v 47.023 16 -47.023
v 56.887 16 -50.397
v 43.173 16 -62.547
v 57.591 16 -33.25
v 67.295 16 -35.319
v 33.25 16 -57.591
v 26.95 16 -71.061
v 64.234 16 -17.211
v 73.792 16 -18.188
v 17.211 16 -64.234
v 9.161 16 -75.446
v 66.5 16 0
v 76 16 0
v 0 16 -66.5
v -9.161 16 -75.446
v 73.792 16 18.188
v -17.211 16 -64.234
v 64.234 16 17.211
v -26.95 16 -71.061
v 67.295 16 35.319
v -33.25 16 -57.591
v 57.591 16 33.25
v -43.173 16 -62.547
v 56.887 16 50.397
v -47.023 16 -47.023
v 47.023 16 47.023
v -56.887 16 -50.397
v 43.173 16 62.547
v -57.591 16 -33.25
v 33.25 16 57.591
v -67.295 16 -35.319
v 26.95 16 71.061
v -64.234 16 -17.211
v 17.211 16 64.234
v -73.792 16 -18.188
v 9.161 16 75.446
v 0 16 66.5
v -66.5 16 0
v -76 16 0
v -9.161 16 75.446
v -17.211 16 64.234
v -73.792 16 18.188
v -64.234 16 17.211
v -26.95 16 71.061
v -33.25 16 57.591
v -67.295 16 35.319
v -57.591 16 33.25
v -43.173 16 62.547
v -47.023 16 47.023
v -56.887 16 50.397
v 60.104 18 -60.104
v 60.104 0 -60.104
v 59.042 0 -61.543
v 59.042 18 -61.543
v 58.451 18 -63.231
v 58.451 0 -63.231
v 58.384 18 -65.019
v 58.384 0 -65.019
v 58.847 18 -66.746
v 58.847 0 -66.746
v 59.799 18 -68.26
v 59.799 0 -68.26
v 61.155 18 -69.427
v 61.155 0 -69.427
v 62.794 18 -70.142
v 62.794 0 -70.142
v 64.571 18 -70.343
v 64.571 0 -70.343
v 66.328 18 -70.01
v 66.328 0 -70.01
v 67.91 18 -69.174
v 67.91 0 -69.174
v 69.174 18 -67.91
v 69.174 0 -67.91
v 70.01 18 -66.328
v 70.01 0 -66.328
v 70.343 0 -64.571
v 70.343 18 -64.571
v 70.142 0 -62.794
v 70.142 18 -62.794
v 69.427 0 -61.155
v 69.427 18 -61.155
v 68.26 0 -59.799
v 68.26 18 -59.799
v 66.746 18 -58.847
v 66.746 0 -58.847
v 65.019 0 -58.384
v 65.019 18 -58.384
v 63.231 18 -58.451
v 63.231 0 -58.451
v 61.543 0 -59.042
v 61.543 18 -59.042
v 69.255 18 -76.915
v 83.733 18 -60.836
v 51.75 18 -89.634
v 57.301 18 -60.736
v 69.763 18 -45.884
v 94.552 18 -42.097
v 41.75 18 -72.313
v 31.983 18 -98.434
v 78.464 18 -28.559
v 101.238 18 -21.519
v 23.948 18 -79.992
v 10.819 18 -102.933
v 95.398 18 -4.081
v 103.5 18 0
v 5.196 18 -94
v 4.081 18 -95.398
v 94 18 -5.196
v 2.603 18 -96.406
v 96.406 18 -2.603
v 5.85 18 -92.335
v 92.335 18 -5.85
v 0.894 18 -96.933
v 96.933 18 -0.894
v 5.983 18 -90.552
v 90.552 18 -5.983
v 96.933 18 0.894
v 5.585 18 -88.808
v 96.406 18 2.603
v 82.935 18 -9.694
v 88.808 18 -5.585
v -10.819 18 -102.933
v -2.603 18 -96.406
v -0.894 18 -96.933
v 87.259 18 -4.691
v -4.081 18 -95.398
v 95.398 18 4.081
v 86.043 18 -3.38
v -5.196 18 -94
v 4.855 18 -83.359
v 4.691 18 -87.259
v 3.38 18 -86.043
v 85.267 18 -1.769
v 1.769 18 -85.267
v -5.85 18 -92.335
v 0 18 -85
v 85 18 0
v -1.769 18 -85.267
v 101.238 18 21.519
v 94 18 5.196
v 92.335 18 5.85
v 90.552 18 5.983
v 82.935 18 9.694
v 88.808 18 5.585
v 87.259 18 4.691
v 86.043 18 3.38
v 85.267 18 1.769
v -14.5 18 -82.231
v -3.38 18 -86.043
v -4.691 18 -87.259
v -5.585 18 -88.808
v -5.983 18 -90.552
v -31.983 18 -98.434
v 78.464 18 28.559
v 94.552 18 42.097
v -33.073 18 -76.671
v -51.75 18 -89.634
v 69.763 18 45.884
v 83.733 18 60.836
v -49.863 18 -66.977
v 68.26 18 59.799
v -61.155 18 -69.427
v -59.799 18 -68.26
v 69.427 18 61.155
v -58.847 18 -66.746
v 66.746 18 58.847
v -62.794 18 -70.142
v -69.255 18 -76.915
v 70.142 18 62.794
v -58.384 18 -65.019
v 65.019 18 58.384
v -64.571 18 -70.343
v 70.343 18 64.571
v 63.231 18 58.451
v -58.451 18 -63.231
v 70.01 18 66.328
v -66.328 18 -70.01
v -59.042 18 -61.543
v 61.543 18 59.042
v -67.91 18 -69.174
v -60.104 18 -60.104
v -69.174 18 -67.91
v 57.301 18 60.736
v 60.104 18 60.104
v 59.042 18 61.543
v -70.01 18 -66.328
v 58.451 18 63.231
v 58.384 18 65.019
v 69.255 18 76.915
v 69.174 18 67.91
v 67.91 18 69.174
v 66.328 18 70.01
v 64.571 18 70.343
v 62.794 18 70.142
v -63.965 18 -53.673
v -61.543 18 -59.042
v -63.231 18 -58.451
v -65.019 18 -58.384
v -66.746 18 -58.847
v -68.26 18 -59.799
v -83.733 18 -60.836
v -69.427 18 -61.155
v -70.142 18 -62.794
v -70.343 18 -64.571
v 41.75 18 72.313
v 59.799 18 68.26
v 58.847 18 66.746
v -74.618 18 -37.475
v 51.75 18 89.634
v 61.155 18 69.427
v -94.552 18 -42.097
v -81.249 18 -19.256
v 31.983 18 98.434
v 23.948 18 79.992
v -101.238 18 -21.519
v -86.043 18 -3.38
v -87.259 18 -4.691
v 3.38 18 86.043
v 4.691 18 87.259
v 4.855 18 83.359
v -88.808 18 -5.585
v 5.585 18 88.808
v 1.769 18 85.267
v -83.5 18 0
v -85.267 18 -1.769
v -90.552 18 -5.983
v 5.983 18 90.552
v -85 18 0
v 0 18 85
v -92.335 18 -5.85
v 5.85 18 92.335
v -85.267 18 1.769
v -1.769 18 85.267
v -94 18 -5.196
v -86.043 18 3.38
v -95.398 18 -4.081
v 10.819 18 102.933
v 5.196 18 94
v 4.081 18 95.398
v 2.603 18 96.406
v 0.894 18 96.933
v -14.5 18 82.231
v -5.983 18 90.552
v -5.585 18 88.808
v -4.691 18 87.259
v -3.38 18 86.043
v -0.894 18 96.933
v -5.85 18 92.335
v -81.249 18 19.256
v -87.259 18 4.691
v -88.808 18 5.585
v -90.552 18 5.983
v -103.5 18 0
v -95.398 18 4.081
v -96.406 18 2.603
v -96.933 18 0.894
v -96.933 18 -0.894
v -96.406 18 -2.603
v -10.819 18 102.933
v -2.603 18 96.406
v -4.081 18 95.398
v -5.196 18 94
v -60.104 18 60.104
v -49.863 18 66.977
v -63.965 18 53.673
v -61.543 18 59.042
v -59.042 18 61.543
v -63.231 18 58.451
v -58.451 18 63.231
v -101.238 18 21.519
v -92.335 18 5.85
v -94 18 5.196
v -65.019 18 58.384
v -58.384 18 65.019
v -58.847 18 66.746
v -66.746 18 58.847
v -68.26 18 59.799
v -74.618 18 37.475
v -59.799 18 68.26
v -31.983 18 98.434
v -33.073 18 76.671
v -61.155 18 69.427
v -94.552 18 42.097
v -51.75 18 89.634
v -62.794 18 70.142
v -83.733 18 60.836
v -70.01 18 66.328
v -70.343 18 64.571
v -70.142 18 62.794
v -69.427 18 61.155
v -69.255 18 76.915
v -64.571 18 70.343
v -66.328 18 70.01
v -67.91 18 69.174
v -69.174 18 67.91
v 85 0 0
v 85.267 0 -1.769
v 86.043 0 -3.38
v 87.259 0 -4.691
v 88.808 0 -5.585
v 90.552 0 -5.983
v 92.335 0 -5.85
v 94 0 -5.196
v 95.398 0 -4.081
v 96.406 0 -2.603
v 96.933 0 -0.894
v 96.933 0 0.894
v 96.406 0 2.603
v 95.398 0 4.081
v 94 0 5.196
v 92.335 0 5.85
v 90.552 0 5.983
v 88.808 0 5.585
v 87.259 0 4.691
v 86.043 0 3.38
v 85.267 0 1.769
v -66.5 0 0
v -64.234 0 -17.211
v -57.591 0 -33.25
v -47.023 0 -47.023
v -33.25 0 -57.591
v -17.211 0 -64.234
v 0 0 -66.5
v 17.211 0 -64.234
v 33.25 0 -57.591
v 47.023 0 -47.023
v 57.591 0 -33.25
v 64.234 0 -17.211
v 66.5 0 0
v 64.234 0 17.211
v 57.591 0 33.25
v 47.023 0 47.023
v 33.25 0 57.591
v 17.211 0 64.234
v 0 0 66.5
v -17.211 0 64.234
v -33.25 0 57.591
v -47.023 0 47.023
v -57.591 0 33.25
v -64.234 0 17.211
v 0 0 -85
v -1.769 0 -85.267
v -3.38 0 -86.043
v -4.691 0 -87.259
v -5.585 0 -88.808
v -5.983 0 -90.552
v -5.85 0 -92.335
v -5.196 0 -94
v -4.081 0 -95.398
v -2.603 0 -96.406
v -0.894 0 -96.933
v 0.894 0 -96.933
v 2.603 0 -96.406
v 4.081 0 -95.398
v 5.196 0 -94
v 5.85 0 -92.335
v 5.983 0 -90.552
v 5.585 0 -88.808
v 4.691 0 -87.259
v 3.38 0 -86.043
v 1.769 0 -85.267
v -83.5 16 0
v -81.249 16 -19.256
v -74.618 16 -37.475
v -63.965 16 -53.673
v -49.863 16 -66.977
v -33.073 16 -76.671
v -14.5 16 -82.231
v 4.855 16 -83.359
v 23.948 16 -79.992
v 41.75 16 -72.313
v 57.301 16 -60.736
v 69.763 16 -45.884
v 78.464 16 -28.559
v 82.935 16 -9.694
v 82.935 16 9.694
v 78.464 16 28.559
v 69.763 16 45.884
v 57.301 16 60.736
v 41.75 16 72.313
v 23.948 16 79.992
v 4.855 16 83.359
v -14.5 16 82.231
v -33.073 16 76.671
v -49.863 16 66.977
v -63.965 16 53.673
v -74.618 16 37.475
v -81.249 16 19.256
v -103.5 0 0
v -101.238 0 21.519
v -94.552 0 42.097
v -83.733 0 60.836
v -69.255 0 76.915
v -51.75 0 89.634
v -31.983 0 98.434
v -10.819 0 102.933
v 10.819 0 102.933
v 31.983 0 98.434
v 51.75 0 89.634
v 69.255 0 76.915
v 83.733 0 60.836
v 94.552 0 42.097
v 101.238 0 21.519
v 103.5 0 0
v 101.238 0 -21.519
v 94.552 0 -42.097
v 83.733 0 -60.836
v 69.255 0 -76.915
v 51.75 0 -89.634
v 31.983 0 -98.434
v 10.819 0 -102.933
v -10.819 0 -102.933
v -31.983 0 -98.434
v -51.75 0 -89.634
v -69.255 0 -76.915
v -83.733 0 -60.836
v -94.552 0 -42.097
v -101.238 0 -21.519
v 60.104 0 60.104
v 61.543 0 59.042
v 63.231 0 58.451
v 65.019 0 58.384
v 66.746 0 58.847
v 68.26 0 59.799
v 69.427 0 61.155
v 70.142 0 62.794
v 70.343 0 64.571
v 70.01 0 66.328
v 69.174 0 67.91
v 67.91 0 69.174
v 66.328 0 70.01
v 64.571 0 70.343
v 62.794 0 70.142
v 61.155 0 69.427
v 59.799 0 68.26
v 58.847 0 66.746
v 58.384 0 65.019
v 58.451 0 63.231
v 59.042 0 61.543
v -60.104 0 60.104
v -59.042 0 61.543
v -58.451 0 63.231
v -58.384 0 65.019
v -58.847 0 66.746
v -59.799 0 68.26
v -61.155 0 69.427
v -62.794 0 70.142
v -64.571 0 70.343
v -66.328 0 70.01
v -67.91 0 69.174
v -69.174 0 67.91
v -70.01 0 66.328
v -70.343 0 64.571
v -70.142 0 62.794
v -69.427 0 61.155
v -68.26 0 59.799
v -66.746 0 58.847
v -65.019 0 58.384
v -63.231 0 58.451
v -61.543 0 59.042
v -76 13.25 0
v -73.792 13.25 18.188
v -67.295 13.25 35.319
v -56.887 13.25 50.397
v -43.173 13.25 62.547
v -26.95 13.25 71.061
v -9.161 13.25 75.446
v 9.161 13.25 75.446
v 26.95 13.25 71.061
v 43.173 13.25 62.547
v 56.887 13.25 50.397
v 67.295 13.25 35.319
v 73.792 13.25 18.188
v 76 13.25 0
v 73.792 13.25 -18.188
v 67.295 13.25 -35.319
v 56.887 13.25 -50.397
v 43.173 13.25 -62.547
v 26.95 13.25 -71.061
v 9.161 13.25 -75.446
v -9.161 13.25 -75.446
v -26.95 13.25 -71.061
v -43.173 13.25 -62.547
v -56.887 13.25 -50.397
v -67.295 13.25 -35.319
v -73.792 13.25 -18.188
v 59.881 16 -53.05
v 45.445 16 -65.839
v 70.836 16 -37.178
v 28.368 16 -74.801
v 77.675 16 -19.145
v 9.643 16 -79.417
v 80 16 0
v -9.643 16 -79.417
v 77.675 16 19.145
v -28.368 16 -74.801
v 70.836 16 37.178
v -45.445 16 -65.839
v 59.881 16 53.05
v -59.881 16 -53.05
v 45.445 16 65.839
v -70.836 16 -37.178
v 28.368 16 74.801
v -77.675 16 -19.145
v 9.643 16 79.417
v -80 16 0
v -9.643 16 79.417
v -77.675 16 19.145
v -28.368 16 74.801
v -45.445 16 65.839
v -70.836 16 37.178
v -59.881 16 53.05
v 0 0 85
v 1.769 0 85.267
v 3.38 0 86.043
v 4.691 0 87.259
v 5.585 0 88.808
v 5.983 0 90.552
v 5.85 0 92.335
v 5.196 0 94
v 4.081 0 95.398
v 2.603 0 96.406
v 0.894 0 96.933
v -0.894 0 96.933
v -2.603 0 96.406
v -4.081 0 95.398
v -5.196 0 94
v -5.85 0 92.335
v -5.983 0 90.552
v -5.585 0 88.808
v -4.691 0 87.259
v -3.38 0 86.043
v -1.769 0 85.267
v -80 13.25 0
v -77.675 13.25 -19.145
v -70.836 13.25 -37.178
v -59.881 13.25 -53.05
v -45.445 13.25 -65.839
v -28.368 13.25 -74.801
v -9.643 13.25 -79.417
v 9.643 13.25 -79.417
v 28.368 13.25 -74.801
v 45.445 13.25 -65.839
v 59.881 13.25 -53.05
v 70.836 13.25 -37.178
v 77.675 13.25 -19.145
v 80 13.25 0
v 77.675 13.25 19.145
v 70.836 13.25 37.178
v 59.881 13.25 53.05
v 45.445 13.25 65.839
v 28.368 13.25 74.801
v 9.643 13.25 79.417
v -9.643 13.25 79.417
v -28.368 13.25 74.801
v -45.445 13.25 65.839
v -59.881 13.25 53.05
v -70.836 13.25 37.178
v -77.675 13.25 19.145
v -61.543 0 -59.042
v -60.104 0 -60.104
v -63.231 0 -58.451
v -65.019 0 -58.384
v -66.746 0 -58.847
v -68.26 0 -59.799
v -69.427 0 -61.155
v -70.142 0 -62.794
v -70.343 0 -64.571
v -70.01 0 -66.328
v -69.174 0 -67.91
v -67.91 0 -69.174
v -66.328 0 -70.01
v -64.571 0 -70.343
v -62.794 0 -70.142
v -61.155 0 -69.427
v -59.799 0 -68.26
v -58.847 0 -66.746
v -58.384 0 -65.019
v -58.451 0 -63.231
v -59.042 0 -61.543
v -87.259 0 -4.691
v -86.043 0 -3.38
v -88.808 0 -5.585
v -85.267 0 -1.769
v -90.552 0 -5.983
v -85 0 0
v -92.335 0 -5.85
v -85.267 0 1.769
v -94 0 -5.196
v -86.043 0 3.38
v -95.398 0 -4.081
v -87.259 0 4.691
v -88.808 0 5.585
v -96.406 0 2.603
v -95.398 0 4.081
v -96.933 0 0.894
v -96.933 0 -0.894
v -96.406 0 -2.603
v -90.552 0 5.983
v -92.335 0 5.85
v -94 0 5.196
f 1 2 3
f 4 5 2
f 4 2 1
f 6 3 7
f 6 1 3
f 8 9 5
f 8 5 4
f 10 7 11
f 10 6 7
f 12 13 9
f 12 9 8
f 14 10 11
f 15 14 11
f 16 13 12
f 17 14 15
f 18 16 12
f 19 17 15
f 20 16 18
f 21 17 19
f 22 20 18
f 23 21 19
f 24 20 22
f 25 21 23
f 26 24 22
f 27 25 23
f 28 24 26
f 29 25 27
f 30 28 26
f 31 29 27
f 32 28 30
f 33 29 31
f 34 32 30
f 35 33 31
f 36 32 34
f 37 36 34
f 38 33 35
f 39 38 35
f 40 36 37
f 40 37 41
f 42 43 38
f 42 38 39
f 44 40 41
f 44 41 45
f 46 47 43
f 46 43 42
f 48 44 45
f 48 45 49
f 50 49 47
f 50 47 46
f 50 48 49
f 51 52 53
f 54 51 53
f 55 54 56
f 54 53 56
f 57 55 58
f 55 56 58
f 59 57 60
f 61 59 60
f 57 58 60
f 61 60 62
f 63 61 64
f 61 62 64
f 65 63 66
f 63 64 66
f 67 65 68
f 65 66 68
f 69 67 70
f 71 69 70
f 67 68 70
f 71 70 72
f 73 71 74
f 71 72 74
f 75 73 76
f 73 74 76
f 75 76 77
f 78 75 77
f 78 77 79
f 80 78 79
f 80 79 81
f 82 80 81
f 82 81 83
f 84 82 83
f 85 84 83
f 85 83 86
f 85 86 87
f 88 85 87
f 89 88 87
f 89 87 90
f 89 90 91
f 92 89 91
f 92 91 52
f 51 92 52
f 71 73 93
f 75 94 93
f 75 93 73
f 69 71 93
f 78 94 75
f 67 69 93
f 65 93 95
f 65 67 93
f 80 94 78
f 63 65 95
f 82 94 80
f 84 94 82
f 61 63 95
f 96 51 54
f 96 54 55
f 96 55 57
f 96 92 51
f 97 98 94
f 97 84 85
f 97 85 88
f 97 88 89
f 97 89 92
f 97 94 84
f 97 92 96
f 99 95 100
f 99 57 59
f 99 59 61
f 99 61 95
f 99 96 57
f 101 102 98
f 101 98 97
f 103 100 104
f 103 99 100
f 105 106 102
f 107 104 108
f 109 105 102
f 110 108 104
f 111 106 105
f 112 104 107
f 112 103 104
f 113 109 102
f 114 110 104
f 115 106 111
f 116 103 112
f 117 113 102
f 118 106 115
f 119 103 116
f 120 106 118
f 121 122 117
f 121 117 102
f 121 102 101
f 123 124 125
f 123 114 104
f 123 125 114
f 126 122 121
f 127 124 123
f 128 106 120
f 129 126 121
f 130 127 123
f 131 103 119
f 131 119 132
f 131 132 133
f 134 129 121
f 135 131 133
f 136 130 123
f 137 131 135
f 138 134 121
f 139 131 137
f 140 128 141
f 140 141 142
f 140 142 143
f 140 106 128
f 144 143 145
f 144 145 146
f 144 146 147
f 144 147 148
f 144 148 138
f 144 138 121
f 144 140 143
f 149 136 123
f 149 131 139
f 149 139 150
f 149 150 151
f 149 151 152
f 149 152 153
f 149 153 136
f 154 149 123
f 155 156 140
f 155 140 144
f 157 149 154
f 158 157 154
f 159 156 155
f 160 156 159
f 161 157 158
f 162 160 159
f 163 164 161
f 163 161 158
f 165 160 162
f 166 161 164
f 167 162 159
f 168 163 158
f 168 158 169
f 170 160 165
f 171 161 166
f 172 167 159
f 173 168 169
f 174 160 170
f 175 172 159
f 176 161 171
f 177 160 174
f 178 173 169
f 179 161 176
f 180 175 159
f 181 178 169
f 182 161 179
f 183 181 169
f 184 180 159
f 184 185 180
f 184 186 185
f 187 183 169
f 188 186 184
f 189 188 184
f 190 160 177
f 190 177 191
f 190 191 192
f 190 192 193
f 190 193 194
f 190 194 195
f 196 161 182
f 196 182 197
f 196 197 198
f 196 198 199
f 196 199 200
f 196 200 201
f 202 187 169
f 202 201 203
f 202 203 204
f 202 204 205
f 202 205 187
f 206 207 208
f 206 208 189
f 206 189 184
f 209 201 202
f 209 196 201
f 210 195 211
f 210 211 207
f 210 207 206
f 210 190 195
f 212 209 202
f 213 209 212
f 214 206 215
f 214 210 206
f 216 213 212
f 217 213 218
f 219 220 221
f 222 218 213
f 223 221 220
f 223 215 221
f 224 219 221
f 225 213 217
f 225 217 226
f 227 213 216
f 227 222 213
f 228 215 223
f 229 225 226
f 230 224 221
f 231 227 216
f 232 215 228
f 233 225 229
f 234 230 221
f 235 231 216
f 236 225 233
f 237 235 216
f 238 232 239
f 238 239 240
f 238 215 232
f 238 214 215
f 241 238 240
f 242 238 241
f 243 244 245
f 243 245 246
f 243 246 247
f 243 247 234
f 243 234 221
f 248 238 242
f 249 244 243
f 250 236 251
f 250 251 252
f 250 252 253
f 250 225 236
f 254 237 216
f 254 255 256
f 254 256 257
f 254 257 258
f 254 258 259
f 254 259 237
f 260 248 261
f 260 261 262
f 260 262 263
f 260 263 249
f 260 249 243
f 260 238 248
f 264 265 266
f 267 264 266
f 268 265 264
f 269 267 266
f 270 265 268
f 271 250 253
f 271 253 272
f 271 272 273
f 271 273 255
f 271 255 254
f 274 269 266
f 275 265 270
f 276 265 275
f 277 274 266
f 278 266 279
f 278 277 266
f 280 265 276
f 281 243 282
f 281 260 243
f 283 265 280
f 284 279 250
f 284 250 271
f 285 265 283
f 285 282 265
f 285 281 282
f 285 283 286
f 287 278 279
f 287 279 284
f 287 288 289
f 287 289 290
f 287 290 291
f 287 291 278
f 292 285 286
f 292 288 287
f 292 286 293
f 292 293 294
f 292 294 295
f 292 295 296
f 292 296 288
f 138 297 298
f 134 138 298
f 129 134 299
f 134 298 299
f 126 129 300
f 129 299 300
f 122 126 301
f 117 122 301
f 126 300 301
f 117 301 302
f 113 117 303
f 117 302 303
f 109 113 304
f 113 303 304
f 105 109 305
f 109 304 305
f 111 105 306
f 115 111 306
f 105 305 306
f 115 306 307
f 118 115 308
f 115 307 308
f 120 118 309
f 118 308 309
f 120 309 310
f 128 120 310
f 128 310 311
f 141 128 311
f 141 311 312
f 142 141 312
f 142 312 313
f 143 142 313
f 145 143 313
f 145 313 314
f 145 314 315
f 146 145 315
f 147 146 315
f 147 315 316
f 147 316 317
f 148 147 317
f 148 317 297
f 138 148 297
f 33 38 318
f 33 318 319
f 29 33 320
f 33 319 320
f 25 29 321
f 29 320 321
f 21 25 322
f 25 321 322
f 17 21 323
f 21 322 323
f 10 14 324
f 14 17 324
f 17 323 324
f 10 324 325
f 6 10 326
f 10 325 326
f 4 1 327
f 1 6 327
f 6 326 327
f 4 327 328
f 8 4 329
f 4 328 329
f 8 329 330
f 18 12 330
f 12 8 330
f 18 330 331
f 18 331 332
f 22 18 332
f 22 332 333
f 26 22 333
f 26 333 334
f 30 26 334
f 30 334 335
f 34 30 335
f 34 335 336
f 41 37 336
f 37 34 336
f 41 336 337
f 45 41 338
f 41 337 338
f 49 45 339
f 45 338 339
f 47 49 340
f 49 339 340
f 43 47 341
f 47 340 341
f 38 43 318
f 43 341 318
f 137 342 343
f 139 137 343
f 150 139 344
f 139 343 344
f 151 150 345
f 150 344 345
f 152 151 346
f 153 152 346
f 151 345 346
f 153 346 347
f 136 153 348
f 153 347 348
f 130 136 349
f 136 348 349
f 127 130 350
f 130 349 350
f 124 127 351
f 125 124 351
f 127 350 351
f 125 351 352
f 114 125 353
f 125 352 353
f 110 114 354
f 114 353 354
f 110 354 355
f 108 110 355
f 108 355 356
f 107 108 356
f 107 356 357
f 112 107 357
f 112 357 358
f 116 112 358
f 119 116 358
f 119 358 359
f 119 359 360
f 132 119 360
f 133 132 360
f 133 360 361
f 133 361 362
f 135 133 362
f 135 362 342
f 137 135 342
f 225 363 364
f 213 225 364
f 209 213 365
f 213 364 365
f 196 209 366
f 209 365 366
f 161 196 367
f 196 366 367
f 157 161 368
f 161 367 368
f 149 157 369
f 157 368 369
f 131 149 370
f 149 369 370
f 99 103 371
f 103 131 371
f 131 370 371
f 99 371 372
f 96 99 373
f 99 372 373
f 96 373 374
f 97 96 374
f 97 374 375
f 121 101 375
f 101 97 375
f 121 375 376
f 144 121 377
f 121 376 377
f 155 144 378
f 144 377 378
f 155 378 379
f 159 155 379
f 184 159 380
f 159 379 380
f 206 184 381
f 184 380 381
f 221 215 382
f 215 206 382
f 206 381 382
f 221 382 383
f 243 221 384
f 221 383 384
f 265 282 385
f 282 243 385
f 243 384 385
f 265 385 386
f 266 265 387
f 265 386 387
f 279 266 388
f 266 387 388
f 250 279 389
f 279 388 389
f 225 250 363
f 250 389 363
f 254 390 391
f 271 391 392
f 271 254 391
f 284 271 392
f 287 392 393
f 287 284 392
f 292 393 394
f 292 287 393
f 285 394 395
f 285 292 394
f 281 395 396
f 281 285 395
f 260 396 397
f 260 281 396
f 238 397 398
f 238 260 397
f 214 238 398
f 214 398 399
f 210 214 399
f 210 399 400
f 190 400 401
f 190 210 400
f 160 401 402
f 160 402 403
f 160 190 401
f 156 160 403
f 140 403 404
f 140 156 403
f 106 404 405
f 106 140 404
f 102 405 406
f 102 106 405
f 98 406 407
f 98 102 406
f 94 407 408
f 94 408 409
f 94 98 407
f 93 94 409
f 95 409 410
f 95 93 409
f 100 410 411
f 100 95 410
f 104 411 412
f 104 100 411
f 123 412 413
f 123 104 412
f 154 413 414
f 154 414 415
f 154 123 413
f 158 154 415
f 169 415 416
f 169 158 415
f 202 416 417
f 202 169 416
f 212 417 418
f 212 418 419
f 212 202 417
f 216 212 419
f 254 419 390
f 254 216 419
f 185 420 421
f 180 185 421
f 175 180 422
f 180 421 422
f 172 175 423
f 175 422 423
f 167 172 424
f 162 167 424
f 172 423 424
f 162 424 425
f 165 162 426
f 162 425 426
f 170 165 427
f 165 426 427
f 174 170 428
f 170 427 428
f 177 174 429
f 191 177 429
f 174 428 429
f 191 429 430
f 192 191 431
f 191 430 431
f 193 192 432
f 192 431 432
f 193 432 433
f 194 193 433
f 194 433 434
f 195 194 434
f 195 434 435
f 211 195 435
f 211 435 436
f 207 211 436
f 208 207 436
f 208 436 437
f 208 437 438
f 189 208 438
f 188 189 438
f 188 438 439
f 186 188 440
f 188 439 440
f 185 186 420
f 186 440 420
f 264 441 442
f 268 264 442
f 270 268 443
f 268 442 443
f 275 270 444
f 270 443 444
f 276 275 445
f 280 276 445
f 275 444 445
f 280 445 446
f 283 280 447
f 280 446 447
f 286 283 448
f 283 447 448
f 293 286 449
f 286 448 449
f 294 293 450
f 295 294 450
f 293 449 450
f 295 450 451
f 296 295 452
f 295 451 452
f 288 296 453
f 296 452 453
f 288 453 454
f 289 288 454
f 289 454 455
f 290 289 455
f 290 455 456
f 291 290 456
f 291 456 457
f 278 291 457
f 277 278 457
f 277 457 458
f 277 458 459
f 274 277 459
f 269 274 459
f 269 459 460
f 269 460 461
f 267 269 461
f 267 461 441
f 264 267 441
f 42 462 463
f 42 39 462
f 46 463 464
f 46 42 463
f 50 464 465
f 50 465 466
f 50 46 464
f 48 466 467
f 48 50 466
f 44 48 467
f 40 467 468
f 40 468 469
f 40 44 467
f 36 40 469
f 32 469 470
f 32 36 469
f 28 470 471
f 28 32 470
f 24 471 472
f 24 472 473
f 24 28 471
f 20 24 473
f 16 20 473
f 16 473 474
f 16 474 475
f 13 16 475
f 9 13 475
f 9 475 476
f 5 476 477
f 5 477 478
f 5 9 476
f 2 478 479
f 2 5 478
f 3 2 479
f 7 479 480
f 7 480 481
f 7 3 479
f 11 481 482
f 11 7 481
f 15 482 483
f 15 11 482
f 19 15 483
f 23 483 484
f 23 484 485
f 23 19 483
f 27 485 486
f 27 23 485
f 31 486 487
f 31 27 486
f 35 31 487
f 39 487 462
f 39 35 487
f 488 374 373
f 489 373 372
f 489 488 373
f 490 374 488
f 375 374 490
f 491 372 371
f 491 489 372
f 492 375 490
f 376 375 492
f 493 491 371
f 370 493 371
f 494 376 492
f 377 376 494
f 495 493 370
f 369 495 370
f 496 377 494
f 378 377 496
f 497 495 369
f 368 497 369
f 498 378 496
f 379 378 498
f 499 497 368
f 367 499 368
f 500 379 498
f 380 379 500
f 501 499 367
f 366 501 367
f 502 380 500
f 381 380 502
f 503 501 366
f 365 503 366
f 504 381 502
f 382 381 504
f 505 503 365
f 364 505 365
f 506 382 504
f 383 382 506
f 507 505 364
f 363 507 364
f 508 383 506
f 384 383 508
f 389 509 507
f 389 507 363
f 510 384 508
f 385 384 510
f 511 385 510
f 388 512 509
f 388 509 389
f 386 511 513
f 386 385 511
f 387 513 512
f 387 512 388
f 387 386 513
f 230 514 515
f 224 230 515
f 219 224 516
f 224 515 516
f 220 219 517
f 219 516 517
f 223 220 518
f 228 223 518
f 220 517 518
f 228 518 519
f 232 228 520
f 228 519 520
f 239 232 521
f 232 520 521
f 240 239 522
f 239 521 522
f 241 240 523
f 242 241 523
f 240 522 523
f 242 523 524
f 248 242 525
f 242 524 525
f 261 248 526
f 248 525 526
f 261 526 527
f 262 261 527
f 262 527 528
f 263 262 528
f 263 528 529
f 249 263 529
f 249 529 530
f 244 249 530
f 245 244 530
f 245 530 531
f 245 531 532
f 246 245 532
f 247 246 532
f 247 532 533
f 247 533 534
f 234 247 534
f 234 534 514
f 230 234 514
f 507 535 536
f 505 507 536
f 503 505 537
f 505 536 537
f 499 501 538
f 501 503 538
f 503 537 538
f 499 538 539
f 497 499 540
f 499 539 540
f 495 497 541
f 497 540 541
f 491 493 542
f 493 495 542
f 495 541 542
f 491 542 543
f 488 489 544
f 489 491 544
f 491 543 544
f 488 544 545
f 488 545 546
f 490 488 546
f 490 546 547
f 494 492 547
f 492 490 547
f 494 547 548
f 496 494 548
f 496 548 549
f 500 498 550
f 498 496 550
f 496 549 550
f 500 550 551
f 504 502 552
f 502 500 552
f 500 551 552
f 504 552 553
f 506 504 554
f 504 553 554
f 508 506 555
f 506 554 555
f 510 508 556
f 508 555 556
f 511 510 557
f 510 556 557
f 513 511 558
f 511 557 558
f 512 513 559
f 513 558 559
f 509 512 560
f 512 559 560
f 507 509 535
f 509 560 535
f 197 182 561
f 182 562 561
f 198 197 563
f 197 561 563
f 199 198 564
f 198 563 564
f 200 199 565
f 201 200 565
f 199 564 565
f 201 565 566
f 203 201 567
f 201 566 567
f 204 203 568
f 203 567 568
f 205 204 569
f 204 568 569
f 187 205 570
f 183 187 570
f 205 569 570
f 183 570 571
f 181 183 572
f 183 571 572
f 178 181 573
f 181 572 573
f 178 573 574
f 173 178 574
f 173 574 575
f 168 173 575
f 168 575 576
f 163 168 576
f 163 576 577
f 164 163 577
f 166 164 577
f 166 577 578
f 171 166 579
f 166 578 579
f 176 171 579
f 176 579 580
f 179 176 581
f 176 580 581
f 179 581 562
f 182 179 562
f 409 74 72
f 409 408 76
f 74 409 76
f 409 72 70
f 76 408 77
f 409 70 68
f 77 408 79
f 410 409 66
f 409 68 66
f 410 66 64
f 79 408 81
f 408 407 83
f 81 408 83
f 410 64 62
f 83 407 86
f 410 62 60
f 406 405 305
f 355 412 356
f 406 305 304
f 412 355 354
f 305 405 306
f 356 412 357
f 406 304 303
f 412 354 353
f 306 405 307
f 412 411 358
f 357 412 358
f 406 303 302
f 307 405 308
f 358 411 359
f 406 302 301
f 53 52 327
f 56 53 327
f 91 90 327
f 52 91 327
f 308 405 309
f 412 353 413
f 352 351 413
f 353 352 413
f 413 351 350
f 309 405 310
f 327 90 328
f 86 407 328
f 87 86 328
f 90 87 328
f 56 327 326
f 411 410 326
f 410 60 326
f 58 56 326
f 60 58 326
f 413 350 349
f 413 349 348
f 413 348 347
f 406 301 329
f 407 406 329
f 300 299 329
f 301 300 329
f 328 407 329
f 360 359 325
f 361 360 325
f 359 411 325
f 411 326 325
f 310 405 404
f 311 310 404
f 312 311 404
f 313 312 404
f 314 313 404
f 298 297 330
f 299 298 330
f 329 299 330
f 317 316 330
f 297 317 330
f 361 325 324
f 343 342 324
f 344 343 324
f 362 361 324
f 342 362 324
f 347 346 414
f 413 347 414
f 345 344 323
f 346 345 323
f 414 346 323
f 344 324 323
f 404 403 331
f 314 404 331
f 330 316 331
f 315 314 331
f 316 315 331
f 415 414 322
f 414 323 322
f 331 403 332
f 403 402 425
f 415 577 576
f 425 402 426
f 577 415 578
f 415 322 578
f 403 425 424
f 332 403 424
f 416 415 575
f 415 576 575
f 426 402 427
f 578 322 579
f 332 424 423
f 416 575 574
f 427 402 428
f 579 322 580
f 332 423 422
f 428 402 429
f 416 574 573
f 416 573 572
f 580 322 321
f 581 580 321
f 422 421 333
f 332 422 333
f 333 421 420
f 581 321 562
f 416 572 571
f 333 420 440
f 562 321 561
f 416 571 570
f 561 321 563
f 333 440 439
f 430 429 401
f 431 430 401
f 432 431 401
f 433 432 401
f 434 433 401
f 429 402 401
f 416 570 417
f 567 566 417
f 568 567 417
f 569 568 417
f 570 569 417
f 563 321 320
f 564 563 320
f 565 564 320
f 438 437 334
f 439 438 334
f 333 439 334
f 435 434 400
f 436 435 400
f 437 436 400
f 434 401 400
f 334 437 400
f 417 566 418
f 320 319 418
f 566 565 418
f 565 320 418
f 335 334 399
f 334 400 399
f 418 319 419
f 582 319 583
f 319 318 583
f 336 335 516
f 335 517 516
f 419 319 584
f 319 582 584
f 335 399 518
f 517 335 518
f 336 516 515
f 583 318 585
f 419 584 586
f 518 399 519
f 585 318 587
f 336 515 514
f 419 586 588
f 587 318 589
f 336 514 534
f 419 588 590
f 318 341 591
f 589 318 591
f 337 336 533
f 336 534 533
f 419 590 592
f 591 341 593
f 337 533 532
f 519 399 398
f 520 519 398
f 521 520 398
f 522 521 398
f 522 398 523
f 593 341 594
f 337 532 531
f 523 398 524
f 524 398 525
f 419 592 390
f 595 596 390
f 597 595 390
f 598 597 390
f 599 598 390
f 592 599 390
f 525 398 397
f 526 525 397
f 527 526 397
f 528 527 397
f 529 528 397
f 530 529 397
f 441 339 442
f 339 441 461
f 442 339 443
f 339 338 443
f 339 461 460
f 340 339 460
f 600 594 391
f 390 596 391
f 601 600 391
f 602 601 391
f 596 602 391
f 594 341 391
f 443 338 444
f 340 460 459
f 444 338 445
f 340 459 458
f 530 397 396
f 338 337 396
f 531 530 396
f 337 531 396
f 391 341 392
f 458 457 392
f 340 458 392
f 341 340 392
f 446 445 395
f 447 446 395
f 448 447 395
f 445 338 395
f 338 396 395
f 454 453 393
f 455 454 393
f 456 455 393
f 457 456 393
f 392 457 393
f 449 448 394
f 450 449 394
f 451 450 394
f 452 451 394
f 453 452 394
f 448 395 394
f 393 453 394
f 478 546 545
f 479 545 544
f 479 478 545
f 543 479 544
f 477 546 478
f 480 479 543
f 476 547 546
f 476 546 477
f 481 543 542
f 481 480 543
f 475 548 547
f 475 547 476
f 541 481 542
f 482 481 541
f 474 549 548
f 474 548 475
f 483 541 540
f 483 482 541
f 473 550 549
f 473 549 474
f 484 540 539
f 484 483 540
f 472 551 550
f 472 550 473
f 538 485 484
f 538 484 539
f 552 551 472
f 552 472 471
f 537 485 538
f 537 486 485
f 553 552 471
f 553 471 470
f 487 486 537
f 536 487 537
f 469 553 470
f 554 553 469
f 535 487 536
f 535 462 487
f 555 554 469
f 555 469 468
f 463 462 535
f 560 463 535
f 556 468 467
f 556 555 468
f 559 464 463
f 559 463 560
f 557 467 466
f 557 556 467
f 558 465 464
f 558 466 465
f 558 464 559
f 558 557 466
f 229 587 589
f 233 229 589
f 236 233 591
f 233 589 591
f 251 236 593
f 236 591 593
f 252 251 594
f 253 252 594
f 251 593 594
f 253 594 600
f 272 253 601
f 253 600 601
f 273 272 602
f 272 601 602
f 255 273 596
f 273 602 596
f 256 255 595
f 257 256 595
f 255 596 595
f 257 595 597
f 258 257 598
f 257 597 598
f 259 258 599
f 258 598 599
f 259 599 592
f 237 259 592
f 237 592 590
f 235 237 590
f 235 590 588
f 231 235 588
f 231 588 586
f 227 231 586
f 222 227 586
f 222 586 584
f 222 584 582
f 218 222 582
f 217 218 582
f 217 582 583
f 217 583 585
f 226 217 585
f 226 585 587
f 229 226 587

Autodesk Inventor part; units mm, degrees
ref_plane "YZ Plane" through (0, 0, 0) normal (1, 0, 0) x (0, 1, 0)
ref_plane "XZ Plane" through (0, 0, 0) normal (0, 1, 0) x (-1, 0, 0)
ref_plane "XY Plane" through (0, 0, 0) normal (0, 0, 1) x (1, 0, 0)
sketch "Sketch1" plane through (0, 0, 0) normal (0, 0, 1) x (1, 0, 0)
  line L0 (-103.5, 0) -> (-103.5, 18)
  line L1 (-103.5, 18) -> (-83.5, 18)
  line L2 (-83.5, 18) -> (-83.5, 16)
  line L3 (-83.5, 16) -> (-80, 16)
  line L4 (-80, 16) -> (-80, 13.25)
  line L5 (-80, 13.25) -> (-76, 13.25)
  line L6 (-76, 13.25) -> (-76, 16)
  line L7 (-76, 16) -> (-66.5, 16)
  line L8 (-66.5, 16) -> (-66.5, 0)
  line L9 (-66.5, 0) -> (-103.5, 0)
  line L10 (0, -3.6) -> (0, 21.6) projected
  point P0 (0, 0)
  dimension "d0" = 103.5
  dimension "d1" = 20
  dimension "d2" = 4
  dimension "d3" = 76
  dimension "d4" = 66.5
  dimension "d5" = 18
  dimension "d6" = 2
  dimension "d7" = 2.75
revolve "Revolution1" add sketch "Sketch1" angle 360 about axis through (0, -10, 0) along (0, 1, 0)
sketch "Sketch2" plane through (0, 18, 0) normal (0, 1, 0) x (1, 0, 0)
  circle A0 centre (0, 0) radius 103.5 projected
  point P0 (0, 91)
  dimension "d9" = 91
hole "Hole1" at (0, 18, -91) direction (0, -1, 0) diameter 12 end through all
pattern_circular "Circular Pattern1" count 8 over 360 about axis through (0, 8, 0) along (0, 1, 0) of "Hole1"
properties part number "CollarRingTop" material "Stainless Steel"
